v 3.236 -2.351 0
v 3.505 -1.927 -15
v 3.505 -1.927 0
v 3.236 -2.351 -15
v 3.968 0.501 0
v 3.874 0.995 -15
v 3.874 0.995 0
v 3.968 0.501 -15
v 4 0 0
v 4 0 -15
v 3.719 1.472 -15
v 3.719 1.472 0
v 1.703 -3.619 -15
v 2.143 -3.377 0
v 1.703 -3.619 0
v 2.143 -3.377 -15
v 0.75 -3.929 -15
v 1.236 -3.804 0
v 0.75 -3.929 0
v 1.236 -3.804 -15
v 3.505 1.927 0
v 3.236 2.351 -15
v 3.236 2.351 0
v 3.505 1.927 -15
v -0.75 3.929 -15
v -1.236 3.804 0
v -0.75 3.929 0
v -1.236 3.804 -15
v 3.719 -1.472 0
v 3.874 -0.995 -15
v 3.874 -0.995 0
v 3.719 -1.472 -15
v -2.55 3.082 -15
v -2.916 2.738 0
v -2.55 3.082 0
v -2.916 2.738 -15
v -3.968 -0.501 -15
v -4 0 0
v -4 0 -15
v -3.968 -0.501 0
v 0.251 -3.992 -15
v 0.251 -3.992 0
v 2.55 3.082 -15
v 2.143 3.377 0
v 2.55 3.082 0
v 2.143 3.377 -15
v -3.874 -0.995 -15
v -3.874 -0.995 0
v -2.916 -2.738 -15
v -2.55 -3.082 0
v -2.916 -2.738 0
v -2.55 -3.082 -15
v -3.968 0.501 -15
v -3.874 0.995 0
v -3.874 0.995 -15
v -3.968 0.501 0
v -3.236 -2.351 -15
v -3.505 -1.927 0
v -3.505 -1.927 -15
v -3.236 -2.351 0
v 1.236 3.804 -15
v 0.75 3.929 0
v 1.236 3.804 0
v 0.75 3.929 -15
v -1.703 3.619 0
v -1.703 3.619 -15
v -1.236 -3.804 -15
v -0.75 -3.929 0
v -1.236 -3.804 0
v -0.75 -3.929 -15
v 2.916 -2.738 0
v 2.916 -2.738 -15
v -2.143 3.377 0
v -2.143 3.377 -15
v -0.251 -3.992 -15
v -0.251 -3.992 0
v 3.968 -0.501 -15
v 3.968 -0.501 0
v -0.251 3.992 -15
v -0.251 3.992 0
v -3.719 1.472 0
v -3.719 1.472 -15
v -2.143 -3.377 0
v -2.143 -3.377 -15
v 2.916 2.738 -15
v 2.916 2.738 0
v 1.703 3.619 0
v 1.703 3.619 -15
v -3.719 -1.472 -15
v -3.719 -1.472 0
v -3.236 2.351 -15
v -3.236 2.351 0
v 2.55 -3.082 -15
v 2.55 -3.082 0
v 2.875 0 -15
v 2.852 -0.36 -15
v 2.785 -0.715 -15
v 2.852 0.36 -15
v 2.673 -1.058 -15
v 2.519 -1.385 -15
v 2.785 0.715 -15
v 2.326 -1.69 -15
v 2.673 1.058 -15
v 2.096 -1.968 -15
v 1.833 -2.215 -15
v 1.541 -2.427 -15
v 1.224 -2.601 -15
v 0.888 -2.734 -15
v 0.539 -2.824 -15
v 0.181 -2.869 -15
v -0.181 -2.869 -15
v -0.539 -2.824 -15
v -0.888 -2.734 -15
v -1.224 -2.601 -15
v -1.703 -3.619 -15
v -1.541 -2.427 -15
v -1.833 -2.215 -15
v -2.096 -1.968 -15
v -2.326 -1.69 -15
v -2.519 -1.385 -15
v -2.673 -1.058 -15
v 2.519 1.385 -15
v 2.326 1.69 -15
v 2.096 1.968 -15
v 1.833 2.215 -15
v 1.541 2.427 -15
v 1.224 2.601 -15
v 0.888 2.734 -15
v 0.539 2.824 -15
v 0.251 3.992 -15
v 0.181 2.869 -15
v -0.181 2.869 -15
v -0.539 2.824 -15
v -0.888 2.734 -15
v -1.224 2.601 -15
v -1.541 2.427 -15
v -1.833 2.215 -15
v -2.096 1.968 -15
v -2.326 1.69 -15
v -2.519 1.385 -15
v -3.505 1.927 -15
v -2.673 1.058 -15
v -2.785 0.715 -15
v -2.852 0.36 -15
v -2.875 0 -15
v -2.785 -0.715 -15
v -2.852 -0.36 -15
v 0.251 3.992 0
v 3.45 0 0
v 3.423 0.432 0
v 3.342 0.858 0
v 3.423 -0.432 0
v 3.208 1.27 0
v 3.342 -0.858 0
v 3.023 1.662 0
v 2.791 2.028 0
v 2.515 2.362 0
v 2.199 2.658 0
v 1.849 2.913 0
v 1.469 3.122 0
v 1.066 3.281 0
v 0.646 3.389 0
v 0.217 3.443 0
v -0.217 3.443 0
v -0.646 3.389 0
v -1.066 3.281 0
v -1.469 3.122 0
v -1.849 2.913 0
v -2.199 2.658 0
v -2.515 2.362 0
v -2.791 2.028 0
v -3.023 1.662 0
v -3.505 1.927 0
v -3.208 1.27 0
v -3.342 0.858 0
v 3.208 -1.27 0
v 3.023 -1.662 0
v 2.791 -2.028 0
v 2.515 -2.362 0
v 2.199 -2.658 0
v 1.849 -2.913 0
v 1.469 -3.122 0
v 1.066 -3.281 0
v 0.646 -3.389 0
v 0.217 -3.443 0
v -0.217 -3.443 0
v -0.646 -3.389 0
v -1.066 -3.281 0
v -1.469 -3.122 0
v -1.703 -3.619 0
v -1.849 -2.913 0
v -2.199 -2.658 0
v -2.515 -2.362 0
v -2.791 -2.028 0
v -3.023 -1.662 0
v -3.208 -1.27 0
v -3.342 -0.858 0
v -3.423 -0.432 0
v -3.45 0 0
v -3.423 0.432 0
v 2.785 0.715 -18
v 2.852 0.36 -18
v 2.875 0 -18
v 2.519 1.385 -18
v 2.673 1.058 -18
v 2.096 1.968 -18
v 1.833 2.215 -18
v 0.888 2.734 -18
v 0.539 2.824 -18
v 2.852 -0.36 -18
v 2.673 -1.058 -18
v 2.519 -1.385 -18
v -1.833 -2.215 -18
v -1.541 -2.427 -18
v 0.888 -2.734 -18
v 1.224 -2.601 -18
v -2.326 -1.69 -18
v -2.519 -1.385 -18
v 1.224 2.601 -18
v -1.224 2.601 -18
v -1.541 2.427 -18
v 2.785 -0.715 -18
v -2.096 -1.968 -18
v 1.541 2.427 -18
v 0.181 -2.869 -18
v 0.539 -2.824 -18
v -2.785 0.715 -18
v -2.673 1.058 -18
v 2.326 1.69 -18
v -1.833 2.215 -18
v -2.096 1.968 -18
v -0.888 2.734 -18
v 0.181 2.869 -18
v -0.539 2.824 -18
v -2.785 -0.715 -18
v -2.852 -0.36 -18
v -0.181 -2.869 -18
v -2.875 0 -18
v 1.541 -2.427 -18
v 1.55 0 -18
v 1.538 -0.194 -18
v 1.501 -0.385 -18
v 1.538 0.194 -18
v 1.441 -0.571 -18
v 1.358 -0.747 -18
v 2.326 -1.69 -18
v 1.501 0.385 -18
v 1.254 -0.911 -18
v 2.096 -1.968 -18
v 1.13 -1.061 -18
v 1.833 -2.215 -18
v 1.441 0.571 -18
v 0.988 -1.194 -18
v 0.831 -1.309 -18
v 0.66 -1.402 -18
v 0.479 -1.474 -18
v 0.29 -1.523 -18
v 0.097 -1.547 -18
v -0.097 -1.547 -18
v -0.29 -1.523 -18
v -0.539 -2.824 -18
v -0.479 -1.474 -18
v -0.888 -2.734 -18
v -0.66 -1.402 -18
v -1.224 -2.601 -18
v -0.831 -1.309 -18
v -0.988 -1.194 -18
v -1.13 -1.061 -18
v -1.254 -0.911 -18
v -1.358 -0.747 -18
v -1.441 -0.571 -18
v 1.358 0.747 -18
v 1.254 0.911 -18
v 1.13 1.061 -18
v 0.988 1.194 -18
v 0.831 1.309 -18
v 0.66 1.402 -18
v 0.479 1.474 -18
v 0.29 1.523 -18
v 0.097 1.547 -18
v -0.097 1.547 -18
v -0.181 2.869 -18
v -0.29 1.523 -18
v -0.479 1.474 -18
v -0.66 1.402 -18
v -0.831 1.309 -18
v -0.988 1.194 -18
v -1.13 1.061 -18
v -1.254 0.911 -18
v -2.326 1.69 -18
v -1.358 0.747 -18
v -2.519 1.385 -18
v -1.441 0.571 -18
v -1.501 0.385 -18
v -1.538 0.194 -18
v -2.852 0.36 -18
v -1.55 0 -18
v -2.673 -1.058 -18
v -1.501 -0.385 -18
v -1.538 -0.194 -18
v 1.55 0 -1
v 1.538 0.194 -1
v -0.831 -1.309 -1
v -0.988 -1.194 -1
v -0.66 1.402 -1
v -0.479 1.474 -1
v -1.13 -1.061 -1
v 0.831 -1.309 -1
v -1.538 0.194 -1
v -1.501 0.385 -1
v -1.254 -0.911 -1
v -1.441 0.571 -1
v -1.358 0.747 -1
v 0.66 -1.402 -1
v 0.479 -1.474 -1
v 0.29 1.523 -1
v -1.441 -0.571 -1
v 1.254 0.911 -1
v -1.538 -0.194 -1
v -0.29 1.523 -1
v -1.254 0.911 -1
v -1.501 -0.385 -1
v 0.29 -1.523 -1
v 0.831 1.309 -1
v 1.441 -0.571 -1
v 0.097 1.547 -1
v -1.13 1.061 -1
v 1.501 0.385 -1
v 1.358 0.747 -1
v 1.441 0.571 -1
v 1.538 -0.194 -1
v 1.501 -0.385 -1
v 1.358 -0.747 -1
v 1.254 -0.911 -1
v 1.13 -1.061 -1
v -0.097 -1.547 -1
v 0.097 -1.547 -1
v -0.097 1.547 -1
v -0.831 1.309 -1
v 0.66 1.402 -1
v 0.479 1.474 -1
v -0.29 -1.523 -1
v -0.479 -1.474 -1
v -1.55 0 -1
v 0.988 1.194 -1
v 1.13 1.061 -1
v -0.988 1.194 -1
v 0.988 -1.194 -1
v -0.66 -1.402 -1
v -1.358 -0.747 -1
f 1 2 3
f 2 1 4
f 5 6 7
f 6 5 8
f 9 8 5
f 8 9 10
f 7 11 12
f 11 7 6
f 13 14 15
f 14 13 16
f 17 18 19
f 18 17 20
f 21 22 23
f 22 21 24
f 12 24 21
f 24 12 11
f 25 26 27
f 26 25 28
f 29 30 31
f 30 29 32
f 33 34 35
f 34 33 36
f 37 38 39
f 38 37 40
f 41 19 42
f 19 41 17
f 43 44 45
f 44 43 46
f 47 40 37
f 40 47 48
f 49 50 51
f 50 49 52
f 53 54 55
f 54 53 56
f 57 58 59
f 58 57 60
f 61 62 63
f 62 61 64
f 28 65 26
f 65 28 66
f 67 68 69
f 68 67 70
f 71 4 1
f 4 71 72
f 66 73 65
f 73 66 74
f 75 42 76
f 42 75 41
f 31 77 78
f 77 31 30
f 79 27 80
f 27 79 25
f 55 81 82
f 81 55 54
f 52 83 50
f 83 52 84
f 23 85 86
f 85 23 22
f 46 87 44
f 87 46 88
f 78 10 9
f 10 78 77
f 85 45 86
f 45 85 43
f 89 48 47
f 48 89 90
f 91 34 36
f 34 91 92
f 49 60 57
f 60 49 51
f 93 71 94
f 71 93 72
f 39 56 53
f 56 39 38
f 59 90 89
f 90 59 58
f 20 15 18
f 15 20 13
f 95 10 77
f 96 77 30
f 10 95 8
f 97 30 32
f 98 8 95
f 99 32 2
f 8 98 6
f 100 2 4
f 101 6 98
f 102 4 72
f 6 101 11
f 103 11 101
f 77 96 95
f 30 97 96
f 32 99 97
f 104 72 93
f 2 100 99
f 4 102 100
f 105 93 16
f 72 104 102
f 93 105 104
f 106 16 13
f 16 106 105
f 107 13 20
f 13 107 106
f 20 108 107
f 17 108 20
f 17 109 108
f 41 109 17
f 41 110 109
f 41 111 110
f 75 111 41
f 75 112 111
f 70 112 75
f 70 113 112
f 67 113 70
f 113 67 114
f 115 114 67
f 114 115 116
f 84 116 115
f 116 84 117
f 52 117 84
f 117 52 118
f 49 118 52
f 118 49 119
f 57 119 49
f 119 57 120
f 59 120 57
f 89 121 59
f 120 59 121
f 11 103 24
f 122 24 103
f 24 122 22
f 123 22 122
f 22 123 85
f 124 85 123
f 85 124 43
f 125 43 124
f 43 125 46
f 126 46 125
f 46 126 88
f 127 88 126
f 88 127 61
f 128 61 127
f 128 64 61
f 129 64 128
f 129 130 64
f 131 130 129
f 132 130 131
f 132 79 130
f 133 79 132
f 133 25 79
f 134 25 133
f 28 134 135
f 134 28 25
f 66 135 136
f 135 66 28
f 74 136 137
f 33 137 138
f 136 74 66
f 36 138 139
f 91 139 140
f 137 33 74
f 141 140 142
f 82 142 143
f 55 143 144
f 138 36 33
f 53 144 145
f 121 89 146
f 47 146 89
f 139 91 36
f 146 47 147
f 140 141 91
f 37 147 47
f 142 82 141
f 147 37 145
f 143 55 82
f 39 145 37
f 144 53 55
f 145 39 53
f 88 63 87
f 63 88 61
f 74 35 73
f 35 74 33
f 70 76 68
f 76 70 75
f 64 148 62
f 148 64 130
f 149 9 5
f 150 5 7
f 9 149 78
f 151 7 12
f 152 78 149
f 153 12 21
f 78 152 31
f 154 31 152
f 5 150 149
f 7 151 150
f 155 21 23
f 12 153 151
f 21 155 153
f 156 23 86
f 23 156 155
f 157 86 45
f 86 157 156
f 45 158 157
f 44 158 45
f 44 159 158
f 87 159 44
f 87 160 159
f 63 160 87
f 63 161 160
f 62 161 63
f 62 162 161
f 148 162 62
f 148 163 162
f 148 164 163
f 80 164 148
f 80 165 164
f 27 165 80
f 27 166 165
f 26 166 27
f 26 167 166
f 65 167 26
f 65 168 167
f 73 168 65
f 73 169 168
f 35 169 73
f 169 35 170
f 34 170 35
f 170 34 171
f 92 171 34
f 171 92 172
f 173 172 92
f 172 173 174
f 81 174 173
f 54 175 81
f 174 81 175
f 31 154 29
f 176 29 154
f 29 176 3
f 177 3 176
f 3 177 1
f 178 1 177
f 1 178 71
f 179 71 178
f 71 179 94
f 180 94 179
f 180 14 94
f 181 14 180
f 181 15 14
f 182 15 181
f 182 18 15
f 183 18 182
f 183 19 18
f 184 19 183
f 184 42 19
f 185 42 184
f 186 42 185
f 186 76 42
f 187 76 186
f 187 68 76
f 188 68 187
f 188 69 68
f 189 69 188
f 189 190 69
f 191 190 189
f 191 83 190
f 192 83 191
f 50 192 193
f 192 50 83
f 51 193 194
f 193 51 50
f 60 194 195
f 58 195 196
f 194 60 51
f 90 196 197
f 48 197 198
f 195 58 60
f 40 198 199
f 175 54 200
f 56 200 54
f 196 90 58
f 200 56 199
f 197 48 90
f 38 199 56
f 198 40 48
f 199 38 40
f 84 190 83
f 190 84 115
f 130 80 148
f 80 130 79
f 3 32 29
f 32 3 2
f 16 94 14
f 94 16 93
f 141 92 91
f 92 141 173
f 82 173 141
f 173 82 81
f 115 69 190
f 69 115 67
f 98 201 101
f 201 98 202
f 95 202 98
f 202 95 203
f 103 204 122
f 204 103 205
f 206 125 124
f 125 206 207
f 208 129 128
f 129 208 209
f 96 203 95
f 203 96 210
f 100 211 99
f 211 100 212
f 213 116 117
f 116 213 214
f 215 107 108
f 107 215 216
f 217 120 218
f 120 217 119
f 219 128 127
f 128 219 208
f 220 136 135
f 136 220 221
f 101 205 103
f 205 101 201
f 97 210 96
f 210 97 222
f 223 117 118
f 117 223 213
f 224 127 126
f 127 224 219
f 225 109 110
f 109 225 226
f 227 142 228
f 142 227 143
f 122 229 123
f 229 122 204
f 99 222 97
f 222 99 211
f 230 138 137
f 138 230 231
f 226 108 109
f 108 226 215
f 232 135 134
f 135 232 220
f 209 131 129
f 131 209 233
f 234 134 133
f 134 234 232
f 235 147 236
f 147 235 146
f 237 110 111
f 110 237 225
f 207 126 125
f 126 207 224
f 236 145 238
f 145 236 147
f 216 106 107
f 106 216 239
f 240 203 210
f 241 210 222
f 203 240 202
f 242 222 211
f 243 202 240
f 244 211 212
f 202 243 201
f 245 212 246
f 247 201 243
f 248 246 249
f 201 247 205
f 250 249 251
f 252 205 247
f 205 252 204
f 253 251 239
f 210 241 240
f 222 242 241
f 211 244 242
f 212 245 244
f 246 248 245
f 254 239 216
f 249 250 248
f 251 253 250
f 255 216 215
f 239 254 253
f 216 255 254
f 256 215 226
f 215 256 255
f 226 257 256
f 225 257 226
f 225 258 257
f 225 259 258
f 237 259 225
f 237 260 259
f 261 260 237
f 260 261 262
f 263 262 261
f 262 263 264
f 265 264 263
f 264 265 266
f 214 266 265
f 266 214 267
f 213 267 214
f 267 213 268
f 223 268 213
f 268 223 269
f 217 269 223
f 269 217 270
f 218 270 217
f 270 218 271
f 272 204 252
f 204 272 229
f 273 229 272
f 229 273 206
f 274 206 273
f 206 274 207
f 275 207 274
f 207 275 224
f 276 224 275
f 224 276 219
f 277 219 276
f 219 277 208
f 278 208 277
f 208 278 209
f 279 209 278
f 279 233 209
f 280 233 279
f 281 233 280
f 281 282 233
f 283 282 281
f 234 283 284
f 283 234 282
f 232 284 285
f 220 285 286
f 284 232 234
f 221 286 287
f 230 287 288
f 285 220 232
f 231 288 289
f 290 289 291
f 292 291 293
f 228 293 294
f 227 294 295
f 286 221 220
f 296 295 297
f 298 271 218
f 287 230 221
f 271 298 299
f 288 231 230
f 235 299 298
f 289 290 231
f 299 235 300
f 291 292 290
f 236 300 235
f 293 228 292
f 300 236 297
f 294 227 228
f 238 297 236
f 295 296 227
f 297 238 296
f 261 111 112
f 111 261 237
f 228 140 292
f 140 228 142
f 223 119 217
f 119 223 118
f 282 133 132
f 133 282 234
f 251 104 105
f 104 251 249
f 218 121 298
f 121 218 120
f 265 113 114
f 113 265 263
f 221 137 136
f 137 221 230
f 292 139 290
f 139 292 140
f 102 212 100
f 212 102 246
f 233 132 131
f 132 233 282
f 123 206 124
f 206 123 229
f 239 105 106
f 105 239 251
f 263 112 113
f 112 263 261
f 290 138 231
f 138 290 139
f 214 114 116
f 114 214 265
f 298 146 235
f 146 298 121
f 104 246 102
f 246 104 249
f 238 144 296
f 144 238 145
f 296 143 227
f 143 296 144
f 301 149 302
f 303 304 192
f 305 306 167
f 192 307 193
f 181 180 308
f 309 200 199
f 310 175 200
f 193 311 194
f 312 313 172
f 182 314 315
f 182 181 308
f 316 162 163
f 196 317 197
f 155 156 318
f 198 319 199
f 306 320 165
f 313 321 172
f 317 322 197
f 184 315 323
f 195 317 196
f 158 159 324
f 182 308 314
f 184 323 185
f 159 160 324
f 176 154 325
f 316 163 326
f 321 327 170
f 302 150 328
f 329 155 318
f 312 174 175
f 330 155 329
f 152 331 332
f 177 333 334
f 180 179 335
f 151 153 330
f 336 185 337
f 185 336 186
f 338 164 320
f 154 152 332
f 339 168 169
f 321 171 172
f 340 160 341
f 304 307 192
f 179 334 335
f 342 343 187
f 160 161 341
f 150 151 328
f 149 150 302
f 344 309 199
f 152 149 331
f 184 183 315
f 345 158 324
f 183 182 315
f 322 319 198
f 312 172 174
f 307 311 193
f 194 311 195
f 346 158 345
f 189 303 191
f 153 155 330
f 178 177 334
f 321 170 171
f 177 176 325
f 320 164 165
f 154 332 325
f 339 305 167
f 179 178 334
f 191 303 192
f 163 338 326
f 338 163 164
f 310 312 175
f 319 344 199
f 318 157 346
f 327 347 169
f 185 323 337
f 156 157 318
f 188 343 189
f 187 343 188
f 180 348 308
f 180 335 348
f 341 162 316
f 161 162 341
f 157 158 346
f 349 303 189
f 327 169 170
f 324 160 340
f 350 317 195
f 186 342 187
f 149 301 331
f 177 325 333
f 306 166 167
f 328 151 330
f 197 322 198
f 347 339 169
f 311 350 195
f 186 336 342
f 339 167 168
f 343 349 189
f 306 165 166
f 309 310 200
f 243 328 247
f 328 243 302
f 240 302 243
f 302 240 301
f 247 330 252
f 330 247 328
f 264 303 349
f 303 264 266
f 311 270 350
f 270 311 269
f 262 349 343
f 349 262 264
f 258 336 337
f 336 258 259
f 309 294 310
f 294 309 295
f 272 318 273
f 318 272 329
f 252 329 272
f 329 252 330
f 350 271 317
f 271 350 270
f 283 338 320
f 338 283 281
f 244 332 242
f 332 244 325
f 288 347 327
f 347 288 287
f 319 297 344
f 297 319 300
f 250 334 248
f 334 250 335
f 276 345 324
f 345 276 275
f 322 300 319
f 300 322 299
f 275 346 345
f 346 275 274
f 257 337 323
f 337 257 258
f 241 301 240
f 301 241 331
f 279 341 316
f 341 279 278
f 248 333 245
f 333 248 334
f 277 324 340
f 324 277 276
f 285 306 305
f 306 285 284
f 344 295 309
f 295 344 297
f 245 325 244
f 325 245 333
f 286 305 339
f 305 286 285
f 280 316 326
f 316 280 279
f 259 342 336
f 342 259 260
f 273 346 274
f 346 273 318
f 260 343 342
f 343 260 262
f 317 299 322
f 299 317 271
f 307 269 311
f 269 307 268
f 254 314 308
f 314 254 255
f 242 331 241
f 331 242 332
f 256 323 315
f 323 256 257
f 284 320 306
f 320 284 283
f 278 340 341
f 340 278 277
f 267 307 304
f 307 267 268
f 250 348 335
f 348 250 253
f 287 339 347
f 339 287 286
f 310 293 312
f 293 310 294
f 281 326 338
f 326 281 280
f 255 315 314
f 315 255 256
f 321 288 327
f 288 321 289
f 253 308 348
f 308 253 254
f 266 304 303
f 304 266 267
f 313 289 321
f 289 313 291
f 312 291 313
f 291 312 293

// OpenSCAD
$fn = 50;

difference() {
	union() {
		translate(v = [0, 0, -15.0]) {
			cylinder(h = 15, r = 4.0);
		}
		#translate(v = [0, 0, -18.0]) {
			cylinder(h = 18, r = 2.875);
		}
	}
	union() {
		translate(v = [0, 0, 0]) {
			rotate(a = [0, 0, 0]) {
				difference() {
					union() {
						translate(v = [0, 0, -18.0]) {
							cylinder(h = 18, r = 1.25);
						}
						translate(v = [0, 0, -1.0]) {
							cylinder(h = 1.0, r1 = 1.55, r2 = 3.45);
						}
						translate(v = [0, 0, -18.0]) {
							cylinder(h = 18, r = 1.55);
						}
						translate(v = [0, 0, -18.0]) {
							cylinder(h = 18, r = 1.25);
						}
					}
					union();
				}
			}
		}
	}
}
